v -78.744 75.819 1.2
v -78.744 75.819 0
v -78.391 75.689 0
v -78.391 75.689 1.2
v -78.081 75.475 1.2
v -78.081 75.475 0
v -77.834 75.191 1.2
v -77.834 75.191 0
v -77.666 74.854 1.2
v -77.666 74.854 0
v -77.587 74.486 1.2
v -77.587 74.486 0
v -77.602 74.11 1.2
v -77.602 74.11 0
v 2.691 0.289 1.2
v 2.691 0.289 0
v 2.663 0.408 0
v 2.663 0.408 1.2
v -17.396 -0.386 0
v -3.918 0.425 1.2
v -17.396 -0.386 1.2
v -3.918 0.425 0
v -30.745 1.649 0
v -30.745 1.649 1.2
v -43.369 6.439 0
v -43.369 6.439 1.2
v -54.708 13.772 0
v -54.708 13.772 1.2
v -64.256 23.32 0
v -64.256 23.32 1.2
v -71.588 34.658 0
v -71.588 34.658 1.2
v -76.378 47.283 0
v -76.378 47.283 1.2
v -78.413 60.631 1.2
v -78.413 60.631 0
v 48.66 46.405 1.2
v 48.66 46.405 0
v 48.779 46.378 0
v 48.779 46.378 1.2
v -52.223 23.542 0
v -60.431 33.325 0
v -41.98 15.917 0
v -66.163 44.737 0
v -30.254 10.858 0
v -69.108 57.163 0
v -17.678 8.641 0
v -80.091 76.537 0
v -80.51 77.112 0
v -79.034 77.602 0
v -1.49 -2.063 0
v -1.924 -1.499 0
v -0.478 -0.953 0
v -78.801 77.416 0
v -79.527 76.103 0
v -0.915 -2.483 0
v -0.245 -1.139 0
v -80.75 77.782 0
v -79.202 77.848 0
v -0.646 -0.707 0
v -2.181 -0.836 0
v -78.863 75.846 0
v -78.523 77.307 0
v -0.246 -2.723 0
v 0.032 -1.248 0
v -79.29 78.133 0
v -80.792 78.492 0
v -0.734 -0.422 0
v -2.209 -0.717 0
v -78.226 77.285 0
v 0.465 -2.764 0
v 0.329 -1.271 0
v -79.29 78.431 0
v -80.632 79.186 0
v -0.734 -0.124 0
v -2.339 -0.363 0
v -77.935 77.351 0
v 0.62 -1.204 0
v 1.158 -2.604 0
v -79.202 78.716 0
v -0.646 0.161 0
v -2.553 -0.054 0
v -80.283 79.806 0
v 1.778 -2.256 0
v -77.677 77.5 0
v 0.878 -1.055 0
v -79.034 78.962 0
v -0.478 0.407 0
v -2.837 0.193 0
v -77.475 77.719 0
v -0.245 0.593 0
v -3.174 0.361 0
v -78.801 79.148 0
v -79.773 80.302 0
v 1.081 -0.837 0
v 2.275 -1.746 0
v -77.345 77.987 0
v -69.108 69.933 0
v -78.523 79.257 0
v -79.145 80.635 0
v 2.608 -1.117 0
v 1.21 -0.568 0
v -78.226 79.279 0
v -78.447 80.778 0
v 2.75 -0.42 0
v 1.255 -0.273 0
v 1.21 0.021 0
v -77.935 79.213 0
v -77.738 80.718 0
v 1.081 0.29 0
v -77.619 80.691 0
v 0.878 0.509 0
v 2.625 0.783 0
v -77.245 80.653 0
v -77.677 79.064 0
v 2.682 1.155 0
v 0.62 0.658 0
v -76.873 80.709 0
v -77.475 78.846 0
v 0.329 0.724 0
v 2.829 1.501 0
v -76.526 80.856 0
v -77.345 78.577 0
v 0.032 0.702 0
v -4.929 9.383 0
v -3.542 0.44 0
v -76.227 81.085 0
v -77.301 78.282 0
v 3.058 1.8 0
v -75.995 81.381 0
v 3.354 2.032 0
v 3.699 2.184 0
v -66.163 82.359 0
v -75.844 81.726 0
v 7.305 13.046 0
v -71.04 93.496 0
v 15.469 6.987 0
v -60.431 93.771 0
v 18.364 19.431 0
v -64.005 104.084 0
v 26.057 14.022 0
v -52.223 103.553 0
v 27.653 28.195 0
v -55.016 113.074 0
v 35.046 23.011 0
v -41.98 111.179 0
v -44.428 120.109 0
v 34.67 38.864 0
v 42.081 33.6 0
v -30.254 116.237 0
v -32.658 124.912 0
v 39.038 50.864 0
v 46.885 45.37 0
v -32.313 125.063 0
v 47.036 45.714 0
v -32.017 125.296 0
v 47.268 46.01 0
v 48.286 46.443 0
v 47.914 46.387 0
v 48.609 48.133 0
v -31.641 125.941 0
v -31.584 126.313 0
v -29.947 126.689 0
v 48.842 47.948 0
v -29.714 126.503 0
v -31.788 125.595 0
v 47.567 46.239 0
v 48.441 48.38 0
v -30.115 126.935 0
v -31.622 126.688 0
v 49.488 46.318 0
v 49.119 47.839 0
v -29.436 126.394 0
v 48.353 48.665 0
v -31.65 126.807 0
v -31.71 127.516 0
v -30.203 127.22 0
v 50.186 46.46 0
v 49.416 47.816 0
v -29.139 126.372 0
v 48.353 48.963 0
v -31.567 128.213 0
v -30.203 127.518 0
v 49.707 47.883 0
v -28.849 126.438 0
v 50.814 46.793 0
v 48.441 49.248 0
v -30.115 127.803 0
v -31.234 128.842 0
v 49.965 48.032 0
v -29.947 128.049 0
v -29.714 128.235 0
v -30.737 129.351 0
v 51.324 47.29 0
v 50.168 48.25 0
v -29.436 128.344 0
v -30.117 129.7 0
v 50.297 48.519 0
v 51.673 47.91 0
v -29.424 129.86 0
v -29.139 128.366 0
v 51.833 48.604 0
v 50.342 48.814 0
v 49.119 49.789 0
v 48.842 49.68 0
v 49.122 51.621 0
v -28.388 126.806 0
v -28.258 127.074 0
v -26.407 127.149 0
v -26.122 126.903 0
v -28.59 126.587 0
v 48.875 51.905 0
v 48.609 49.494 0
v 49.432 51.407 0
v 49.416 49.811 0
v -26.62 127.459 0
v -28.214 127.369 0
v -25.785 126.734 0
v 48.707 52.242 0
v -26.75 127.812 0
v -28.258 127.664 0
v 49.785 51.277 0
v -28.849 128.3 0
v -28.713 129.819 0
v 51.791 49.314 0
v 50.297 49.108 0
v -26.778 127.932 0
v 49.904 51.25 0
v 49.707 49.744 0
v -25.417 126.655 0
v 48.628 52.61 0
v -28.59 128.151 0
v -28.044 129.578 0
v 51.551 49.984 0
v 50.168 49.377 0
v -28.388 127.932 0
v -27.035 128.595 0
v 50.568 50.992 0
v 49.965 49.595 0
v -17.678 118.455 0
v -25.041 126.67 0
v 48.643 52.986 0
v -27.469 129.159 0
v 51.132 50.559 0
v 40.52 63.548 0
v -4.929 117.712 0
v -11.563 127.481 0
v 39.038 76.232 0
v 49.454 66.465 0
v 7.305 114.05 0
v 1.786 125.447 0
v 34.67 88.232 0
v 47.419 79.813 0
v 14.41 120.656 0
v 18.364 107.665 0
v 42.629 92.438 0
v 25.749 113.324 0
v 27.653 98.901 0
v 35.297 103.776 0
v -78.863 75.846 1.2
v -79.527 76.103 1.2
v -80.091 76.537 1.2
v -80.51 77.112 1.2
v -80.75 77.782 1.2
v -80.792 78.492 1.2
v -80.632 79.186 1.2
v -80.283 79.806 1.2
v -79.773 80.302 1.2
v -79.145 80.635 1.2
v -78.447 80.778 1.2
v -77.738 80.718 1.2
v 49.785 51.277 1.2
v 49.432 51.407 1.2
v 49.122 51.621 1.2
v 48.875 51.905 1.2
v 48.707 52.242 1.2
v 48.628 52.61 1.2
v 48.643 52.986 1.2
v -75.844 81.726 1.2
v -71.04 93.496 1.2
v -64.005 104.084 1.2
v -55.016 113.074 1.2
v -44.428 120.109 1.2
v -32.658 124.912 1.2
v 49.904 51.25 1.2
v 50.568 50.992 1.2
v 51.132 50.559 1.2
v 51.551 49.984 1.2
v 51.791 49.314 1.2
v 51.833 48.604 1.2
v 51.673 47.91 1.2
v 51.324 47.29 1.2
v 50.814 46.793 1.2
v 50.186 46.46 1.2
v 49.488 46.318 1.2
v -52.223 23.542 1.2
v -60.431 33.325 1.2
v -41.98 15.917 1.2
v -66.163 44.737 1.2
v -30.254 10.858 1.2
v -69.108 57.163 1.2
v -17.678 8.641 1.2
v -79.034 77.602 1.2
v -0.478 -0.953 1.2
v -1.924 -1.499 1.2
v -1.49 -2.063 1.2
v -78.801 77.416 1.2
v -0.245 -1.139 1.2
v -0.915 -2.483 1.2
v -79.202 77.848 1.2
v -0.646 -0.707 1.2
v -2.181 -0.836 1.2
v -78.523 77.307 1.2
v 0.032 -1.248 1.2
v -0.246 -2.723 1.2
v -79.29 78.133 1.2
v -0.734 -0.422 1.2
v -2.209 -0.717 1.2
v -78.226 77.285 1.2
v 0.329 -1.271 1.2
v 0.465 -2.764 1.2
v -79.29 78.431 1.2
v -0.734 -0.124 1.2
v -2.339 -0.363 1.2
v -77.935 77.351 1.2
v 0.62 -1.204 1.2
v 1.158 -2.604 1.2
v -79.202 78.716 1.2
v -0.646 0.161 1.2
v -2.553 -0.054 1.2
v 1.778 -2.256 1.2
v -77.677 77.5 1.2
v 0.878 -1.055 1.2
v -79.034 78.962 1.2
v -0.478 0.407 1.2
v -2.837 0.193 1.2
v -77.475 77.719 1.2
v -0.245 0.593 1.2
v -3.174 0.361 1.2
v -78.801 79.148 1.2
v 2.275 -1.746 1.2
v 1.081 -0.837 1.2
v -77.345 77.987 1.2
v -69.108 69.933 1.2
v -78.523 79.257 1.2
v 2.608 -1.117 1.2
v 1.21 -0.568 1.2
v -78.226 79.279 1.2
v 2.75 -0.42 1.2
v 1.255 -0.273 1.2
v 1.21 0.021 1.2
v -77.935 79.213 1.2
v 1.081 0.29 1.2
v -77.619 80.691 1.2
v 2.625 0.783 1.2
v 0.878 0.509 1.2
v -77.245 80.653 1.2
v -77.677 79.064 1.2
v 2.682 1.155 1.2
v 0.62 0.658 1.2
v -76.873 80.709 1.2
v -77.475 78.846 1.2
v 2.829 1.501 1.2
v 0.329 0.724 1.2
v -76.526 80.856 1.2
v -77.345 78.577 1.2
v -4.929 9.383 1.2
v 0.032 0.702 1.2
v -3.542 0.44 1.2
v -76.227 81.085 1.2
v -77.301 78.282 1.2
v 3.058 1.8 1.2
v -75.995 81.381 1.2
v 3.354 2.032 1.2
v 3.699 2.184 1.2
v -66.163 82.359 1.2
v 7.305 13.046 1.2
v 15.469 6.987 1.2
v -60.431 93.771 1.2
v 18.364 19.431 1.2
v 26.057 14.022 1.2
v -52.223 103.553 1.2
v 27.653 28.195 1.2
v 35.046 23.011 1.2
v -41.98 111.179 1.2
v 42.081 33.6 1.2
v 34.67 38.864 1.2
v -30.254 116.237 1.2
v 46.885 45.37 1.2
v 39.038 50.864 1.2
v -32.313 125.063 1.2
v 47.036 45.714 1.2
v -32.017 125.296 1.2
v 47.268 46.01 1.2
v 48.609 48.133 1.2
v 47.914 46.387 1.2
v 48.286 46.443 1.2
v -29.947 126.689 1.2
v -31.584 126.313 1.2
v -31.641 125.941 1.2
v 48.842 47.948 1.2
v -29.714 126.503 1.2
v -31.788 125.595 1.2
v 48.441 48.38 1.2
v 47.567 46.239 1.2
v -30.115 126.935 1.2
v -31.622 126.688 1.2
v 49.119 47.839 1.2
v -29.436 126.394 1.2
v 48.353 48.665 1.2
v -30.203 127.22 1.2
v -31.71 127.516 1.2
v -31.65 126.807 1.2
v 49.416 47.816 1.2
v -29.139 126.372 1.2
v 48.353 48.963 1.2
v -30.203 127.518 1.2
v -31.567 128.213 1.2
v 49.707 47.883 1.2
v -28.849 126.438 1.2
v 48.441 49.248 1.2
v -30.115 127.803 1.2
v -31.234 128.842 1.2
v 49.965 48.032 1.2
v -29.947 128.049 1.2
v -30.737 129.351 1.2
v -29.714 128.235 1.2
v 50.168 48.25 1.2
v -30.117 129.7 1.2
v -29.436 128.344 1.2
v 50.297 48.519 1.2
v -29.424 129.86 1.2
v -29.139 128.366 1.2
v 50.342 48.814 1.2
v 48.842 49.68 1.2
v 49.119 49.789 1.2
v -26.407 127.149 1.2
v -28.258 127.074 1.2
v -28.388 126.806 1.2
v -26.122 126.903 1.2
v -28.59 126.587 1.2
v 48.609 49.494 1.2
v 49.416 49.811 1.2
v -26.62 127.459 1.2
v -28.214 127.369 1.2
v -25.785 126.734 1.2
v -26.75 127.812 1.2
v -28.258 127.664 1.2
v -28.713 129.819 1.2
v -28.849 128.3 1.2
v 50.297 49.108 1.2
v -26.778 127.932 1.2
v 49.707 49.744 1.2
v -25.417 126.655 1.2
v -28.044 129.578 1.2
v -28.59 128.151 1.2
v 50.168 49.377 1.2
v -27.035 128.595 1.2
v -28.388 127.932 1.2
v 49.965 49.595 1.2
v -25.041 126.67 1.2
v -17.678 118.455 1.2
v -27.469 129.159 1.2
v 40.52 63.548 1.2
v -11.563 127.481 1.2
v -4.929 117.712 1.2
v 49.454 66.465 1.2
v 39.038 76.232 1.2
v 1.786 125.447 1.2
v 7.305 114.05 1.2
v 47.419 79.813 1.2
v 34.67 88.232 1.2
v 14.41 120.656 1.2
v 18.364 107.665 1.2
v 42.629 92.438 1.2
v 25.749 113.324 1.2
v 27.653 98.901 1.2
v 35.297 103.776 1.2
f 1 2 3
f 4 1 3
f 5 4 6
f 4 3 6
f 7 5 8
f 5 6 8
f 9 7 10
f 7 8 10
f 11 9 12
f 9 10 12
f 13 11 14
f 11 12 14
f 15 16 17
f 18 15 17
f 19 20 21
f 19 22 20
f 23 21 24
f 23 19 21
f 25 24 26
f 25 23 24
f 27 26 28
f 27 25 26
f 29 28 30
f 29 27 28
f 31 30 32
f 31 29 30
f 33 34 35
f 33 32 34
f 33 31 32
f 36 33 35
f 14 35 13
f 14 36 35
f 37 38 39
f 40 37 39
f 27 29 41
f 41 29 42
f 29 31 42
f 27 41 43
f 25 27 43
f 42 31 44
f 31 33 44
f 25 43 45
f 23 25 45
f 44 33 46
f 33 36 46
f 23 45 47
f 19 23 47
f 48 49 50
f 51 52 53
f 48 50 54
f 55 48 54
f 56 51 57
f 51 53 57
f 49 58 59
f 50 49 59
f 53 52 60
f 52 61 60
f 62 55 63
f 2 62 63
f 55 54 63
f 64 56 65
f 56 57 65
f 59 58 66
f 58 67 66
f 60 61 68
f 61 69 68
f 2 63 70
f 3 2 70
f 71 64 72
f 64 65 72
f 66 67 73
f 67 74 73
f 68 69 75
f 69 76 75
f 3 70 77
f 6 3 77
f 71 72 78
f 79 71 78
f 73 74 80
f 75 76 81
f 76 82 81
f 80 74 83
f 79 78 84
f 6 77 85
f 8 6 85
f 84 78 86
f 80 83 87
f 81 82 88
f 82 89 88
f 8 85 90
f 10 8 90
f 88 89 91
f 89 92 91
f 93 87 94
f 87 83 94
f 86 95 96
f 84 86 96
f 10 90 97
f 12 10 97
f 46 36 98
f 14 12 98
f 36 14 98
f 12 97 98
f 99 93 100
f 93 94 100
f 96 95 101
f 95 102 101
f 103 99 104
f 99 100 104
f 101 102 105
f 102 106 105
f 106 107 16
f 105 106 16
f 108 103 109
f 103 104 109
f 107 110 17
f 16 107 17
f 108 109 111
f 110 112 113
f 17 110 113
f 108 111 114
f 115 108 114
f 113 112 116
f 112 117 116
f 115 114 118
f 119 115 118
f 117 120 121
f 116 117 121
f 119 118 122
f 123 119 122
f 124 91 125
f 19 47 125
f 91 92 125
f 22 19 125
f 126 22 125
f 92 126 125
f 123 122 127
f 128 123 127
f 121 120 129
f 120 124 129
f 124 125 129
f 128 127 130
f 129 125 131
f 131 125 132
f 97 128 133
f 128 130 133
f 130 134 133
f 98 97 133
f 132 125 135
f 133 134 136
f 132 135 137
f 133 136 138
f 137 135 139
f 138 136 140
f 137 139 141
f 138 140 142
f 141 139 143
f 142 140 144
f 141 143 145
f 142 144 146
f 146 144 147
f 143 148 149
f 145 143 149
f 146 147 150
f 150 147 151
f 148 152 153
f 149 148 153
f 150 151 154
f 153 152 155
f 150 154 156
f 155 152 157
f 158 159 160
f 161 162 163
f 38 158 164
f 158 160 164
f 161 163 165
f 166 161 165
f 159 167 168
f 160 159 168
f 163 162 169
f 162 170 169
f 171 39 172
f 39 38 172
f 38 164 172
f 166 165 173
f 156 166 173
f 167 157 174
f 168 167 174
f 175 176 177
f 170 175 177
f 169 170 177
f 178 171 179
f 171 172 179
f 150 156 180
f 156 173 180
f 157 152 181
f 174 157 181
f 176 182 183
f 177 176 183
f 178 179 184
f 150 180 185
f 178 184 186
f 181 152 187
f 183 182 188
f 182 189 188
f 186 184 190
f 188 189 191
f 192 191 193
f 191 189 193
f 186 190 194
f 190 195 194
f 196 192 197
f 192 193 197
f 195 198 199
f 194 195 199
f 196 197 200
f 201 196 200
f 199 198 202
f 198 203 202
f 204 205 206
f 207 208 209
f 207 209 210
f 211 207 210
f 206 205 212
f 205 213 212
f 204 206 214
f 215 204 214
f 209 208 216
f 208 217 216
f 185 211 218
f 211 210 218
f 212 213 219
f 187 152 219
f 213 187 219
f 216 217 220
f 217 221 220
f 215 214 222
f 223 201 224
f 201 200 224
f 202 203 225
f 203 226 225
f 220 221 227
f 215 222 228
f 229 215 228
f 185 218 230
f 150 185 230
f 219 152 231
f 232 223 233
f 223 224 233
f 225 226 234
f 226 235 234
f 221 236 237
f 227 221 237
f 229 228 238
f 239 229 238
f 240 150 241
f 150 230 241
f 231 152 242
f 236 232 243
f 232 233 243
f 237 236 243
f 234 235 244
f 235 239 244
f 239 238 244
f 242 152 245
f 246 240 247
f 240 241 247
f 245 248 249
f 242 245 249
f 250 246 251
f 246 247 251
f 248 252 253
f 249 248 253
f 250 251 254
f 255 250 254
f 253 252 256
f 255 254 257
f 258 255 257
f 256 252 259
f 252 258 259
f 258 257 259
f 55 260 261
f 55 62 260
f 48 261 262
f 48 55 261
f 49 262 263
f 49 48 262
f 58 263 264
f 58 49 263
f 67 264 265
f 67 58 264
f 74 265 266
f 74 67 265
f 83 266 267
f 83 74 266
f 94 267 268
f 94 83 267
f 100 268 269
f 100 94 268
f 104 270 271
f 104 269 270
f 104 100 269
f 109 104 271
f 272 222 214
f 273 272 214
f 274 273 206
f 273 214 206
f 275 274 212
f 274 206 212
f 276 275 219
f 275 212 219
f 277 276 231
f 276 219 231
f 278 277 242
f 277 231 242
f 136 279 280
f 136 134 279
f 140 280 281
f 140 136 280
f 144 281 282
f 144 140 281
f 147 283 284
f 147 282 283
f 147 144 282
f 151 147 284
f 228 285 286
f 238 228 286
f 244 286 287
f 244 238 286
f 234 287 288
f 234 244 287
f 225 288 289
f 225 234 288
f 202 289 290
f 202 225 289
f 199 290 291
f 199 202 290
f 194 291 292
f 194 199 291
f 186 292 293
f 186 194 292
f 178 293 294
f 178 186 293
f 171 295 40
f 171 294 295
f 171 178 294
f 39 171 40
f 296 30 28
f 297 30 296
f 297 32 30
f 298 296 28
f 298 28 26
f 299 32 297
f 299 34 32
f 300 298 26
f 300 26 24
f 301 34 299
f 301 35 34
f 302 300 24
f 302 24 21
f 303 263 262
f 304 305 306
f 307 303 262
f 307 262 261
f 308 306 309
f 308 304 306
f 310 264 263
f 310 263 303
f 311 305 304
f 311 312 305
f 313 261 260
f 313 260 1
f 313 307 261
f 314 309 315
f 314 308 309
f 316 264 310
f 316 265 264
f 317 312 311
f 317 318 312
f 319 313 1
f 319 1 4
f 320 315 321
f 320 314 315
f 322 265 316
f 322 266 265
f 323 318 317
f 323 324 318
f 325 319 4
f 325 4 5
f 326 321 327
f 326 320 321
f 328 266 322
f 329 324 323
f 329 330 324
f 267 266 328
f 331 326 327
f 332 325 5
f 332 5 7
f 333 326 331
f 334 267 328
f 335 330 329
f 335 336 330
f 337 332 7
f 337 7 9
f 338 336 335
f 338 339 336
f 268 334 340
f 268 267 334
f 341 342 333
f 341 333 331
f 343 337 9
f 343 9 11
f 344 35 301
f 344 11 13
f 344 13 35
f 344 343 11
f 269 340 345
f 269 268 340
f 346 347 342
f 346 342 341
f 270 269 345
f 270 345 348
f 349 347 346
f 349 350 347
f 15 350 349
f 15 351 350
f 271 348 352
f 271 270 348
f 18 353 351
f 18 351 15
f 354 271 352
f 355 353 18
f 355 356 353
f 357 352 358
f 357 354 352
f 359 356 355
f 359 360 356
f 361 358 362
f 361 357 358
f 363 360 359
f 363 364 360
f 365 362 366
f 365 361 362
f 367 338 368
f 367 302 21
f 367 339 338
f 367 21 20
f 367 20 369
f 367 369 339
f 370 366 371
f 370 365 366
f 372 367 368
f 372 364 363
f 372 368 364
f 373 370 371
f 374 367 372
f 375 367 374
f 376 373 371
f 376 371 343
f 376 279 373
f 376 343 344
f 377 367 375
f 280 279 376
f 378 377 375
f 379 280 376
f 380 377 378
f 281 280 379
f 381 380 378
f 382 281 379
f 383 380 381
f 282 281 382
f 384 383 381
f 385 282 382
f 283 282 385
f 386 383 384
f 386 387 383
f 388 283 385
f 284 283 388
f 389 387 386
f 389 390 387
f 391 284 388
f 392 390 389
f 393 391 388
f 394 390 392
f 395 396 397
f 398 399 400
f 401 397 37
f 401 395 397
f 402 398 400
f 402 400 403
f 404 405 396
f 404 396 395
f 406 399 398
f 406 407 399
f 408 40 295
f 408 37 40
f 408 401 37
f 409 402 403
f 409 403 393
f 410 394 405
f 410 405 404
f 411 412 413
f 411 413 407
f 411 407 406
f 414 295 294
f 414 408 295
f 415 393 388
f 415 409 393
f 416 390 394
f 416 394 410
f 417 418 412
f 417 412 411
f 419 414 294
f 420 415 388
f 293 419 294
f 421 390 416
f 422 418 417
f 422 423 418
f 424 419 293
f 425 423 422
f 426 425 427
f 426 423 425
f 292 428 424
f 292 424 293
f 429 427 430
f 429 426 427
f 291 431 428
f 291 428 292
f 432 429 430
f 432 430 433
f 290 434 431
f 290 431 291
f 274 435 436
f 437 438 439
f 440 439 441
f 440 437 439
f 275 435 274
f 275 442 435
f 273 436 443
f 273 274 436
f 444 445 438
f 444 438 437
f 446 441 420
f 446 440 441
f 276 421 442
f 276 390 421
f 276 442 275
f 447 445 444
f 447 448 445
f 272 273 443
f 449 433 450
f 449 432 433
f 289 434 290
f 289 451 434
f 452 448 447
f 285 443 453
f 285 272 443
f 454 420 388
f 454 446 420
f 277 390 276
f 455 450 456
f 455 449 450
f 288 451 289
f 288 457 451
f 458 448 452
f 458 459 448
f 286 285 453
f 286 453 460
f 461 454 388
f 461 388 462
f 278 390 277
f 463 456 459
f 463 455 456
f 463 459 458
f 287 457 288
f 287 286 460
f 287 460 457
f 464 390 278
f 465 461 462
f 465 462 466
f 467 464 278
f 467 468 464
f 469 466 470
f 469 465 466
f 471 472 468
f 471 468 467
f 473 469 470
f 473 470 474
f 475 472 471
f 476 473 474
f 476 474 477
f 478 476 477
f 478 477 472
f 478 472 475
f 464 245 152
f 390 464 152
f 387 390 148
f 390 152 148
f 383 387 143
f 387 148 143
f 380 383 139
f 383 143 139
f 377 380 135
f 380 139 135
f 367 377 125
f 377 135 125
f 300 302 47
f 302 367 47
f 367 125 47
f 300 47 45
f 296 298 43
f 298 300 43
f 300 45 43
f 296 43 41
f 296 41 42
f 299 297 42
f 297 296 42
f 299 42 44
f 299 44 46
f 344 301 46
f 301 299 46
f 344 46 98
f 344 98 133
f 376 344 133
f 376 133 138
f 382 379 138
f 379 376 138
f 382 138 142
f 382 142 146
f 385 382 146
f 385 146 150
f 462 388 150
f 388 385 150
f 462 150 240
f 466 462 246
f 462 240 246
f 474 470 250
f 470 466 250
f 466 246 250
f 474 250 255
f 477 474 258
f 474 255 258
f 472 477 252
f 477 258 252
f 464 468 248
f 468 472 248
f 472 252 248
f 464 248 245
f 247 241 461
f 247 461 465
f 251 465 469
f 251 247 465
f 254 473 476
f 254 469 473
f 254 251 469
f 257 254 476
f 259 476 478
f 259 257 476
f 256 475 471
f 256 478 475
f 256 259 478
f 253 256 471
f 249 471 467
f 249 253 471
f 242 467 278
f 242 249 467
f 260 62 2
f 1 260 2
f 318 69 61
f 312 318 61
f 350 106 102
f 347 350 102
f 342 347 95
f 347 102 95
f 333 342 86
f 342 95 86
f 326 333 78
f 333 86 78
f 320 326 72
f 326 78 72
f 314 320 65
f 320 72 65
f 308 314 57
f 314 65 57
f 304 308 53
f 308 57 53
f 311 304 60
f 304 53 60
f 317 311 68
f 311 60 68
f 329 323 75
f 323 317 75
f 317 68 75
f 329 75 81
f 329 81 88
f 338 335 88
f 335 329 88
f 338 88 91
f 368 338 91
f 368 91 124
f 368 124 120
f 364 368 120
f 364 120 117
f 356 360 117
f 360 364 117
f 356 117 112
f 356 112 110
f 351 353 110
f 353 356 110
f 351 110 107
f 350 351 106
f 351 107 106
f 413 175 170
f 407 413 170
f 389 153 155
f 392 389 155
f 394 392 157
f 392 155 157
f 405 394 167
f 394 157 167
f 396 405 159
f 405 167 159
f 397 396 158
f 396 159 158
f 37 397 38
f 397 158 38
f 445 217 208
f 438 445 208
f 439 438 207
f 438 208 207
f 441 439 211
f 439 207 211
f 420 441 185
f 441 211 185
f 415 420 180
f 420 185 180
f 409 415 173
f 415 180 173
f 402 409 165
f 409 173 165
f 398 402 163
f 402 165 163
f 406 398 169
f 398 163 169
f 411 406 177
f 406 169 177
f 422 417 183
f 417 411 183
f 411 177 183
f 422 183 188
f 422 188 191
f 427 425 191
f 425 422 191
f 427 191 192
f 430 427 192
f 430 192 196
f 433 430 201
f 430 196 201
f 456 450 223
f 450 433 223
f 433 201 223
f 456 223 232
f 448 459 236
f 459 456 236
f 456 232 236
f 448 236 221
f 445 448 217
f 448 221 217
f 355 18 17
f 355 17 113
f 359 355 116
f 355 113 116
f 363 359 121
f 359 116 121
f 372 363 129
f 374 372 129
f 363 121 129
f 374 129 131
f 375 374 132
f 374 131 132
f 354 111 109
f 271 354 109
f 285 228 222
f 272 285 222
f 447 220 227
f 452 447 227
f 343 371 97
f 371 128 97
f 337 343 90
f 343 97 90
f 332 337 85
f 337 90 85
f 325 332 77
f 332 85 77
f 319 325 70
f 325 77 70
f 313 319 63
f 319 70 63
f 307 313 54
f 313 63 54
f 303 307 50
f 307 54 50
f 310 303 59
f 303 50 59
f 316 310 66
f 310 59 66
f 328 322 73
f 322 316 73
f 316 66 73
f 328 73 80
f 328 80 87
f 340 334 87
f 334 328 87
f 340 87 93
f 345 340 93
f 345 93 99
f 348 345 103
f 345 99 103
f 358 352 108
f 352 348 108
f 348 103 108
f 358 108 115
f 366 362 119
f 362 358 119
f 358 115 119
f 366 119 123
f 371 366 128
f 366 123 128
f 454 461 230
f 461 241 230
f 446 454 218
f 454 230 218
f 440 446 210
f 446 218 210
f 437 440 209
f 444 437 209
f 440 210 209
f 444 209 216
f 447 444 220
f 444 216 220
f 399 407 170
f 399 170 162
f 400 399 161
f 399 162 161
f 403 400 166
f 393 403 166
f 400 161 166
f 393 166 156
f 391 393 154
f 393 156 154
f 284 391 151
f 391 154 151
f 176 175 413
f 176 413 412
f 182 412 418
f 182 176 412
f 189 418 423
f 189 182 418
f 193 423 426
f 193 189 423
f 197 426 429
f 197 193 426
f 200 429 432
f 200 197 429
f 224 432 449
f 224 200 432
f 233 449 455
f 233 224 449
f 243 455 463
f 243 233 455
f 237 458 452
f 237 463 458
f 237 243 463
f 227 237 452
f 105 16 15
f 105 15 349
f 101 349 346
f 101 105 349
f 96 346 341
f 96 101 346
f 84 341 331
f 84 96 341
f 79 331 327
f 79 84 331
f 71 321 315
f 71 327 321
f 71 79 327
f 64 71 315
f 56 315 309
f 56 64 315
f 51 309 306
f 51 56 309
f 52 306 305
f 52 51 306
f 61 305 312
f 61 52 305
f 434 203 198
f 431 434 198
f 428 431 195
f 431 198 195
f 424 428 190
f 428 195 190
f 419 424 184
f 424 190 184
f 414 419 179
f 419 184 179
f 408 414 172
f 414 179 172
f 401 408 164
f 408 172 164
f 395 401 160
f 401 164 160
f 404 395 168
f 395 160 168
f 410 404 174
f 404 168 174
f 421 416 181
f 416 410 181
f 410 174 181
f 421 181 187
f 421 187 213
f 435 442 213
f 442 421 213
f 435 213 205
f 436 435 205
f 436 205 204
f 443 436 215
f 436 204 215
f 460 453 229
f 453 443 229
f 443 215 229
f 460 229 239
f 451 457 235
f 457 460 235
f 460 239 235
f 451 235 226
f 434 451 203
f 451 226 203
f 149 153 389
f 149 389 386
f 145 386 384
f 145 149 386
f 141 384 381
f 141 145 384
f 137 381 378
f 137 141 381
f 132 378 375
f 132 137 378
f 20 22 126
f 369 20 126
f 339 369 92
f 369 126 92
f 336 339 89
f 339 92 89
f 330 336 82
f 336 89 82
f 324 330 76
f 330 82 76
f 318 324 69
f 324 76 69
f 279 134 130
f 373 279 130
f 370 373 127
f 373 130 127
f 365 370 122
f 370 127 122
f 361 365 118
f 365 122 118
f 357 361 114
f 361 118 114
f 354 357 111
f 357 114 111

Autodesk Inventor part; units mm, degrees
ref_plane "YZ Plane" through (0, 0, 0) normal (1, 0, 0) x (0, 1, 0)
ref_plane "XZ Plane" through (0, 0, 0) normal (0, 1, 0) x (-1, 0, 0)
ref_plane "作業平面1" through (0, 0, 0) normal (0, 0, 1) x (1, 0, 0)
sketch "スケッチ1" plane through (0, 0, 0) normal (0, 0, 1) x (1, 0, 0)
  circle A0 centre (-14.624772, 63.539385) radius 64
  arc A1 (-81.893775, 52.547912) -> (-80.479561, 53.962126) centre (-81.186668, 53.255019) ccw
  line L0 (-81.893775, 52.547912) -> (-83.065348, 52.547912)
  arc A2 (-84.479561, 53.962126) -> (-83.065348, 52.547912) centre (-83.772455, 53.255019) ccw
  line L1 (-84.479561, 53.962126) -> (-84.479561, 73.133699)
  arc A3 (-83.065348, 74.547912) -> (-84.479561, 73.133699) centre (-83.772455, 73.840806) ccw
  line L2 (-83.065348, 74.547912) -> (-81.893775, 74.547912)
  arc A4 (-80.479561, 73.133699) -> (-81.893775, 74.547912) centre (-81.186668, 73.840806) ccw
  line L3 (-80.479561, 73.133699) -> (-80.479561, 53.962126)
  arc A5 (-3.479561, 132.133699) -> (-4.893775, 133.547912) centre (-4.186668, 132.840806) ccw
  line L4 (-3.479561, 132.133699) -> (-3.479561, 130.962126)
  arc A6 (-4.893775, 129.547912) -> (-3.479561, 130.962126) centre (-4.186668, 130.255019) ccw
  line L5 (-4.893775, 129.547912) -> (-24.065348, 129.547912)
  arc A7 (-25.479561, 130.962126) -> (-24.065348, 129.547912) centre (-24.772455, 130.255019) ccw
  line L6 (-25.479561, 130.962126) -> (-25.479561, 132.133699)
  arc A8 (-24.065348, 133.547912) -> (-25.479561, 132.133699) centre (-24.772455, 132.840806) ccw
  line L7 (-24.065348, 133.547912) -> (-4.893775, 133.547912)
  arc A9 (54.106225, 52.547912) -> (55.520439, 53.962126) centre (54.813332, 53.255019) ccw
  line L8 (54.106225, 52.547912) -> (52.934652, 52.547912)
  arc A10 (51.520439, 53.962126) -> (52.934652, 52.547912) centre (52.227545, 53.255019) ccw
  line L9 (51.520439, 53.962126) -> (51.520439, 73.133699)
  arc A11 (52.934652, 74.547912) -> (51.520439, 73.133699) centre (52.227545, 73.840806) ccw
  line L10 (52.934652, 74.547912) -> (54.106225, 74.547912)
  arc A12 (55.520439, 73.133699) -> (54.106225, 74.547912) centre (54.813332, 73.840806) ccw
  line L11 (55.520439, 73.133699) -> (55.520439, 53.962126)
  arc A13 (-25.479561, -5.037874) -> (-24.065348, -6.452088) centre (-24.772455, -5.744981) ccw
  line L12 (-25.479561, -5.037874) -> (-25.479561, -3.866301)
  arc A14 (-24.065348, -2.452088) -> (-25.479561, -3.866301) centre (-24.772455, -3.159194) ccw
  line L13 (-24.065348, -2.452088) -> (-4.893775, -2.452088)
  arc A15 (-3.479561, -3.866301) -> (-4.893775, -2.452088) centre (-4.186668, -3.159194) ccw
  line L14 (-3.479561, -3.866301) -> (-3.479561, -5.037874)
  arc A16 (-4.893775, -6.452088) -> (-3.479561, -5.037874) centre (-4.186668, -5.744981) ccw
  line L15 (-4.893775, -6.452088) -> (-24.065348, -6.452088)
  arc A17 (-90.380937, 104.093949) -> (-92.776199, 103.718007) centre (-91.441598, 103.033289) ccw
  arc A18 (-92.776199, 103.718007) -> (-98.248191, 90.50745) centre (-14.479561, 63.547912) ccw
  arc A19 (-98.248191, 90.50745) -> (-96.820317, 88.547912) centre (-96.820317, 90.047912) ccw
  line L16 (-96.820317, 88.547912) -> (-88.479561, 88.547912)
  arc A20 (-86.479561, 86.547912) -> (-88.479561, 88.547912) centre (-88.479561, 86.547912) ccw
  line L17 (-86.479561, 86.547912) -> (-86.479561, 40.547912)
  arc A21 (-88.479561, 38.547912) -> (-86.479561, 40.547912) centre (-88.479561, 40.547912) ccw
  line L18 (-88.479561, 38.547912) -> (-96.820317, 38.547912)
  arc A22 (-96.820317, 38.547912) -> (-98.248191, 36.588375) centre (-96.820317, 37.047912) ccw
  arc A23 (-98.248191, 36.588375) -> (-41.439099, -20.220717) centre (-14.479561, 63.547912) ccw
  arc A24 (-41.439099, -20.220717) -> (-39.479561, -18.792843) centre (-40.979561, -18.792843) ccw
  line L19 (-39.479561, -18.792843) -> (-39.479561, -10.452088)
  arc A25 (-37.479561, -8.452088) -> (-39.479561, -10.452088) centre (-37.479561, -10.452088) ccw
  line L20 (-37.479561, -8.452088) -> (8.520439, -8.452088)
  arc A26 (10.520439, -10.452088) -> (8.520439, -8.452088) centre (8.520439, -10.452088) ccw
  line L21 (10.520439, -10.452088) -> (10.520439, -18.792843)
  arc A27 (10.520439, -18.792843) -> (12.479976, -20.220717) centre (12.020439, -18.792843) ccw
  arc A28 (12.479976, -20.220717) -> (25.690533, -14.748726) centre (-14.479561, 63.547912) ccw
  arc A29 (25.690533, -14.748726) -> (26.066476, -12.353464) centre (25.005815, -13.414124) ccw
  line L22 (26.066476, -12.353464) -> (20.079693, -6.366681)
  arc A30 (20.079693, -2.124041) -> (20.079693, -6.366681) centre (22.201014, -4.245361) ccw
  line L23 (20.079693, -2.124041) -> (22.554567, 0.350833)
  arc A31 (55.435032, 28.988658) -> (51.192392, 28.988658) centre (53.313712, 26.867337) ccw
  line L24 (55.435032, 28.988658) -> (61.421815, 23.001875)
  arc A32 (61.421815, 23.001875) -> (63.817077, 23.377818) centre (62.482475, 24.062536) ccw
  arc A33 (63.817077, 23.377818) -> (69.289068, 36.588375) centre (-14.479561, 63.547912) ccw
  arc A34 (69.289068, 36.588375) -> (67.861194, 38.547912) centre (67.861194, 37.047912) ccw
  line L25 (67.861194, 38.547912) -> (59.520439, 38.547912)
  arc A35 (57.520439, 40.547912) -> (59.520439, 38.547912) centre (59.520439, 40.547912) ccw
  line L26 (57.520439, 40.547912) -> (57.520439, 86.547912)
  arc A36 (59.520439, 88.547912) -> (57.520439, 86.547912) centre (59.520439, 86.547912) ccw
  line L27 (59.520439, 88.547912) -> (67.861194, 88.547912)
  arc A37 (67.861194, 88.547912) -> (69.289068, 90.50745) centre (67.861194, 90.047912) ccw
  arc A38 (69.289068, 90.50745) -> (12.479976, 147.316542) centre (-14.479561, 63.547912) ccw
  arc A39 (12.479976, 147.316542) -> (10.520439, 145.888668) centre (12.020439, 145.888668) ccw
  line L28 (10.520439, 145.888668) -> (10.520439, 137.547912)
  arc A40 (8.520439, 135.547912) -> (10.520439, 137.547912) centre (8.520439, 137.547912) ccw
  line L29 (8.520439, 135.547912) -> (-37.479561, 135.547912)
  arc A41 (-39.479561, 137.547912) -> (-37.479561, 135.547912) centre (-37.479561, 137.547912) ccw
  line L30 (-39.479561, 137.547912) -> (-39.479561, 145.888668)
  arc A42 (-39.479561, 145.888668) -> (-41.439099, 147.316542) centre (-40.979561, 145.888668) ccw
  arc A43 (-41.439099, 147.316542) -> (-54.649656, 141.84455) centre (-14.479561, 63.547912) ccw
  arc A44 (-54.649656, 141.84455) -> (-55.025598, 139.449288) centre (-53.964938, 140.509949) ccw
  line L31 (-55.025598, 139.449288) -> (-49.038816, 133.462506)
  arc A45 (-49.038816, 129.219865) -> (-49.038816, 133.462506) centre (-51.160136, 131.341186) ccw
  line L32 (-54.342117, 123.916565) -> (-74.848214, 103.410468)
  arc A46 (-84.394155, 98.107167) -> (-80.151514, 98.107167) centre (-82.272835, 100.228487) ccw
  line L33 (-84.394155, 98.107167) -> (-90.380937, 104.093949)
  arc A47 (-32.657783, 124.912008) -> (-31.62228, 126.687656) centre (-33.083835, 126.350229) ccw
  line L34 (-31.62228, 126.687656) -> (-31.649781, 126.806774)
  arc A48 (-26.77793, 127.931529) -> (-31.649781, 126.806774) centre (-29.213855, 127.369152) ccw
  line L35 (-26.77793, 127.931529) -> (-26.75043, 127.812411)
  arc A49 (-26.75043, 127.812411) -> (-25.041333, 126.670404) centre (-25.288875, 128.149838) ccw
  arc A50 (48.642931, 52.986141) -> (-25.041333, 126.670404) centre (-14.479561, 63.547912) ccw
  arc A51 (48.642931, 52.986141) -> (49.784937, 51.277044) centre (50.122364, 52.738599) ccw
  line L36 (49.784937, 51.277044) -> (49.904056, 51.249544)
  arc A52 (48.7793, 46.377693) -> (49.904056, 51.249544) centre (49.341678, 48.813618) ccw
  line L37 (48.7793, 46.377693) -> (48.660182, 46.405194)
  arc A53 (48.660182, 46.405194) -> (46.884535, 45.369691) centre (48.322756, 44.943639) ccw
  arc A54 (3.69866, 2.183817) -> (46.884535, 45.369691) centre (-14.479561, 63.547912) ccw
  arc A55 (3.69866, 2.183817) -> (2.663157, 0.408169) centre (4.124712, 0.745596) ccw
  line L38 (2.663157, 0.408169) -> (2.690658, 0.289051)
  arc A56 (-2.181192, -0.835704) -> (2.690658, 0.289051) centre (0.254733, -0.273327) ccw
  line L39 (-2.181192, -0.835704) -> (-2.208693, -0.716586)
  arc A57 (-2.208693, -0.716586) -> (-3.91779, 0.425421) centre (-3.670248, -1.054013) ccw
  arc A58 (-77.602053, 74.109684) -> (-3.91779, 0.425421) centre (-14.479561, 63.547912) ccw
  arc A59 (-77.602053, 74.109684) -> (-78.74406, 75.818781) centre (-79.081487, 74.357226) ccw
  line L40 (-78.74406, 75.818781) -> (-78.863178, 75.846281)
  arc A60 (-77.738423, 80.718132) -> (-78.863178, 75.846281) centre (-78.300801, 78.282206) ccw
  line L41 (-77.738423, 80.718132) -> (-77.619305, 80.690631)
  arc A61 (-77.619305, 80.690631) -> (-75.843657, 81.726134) centre (-77.281878, 82.152186) ccw
  arc A62 (-32.657783, 124.912008) -> (-75.843657, 81.726134) centre (-14.479561, 63.547912) ccw
  circle A63 centre (65.069166, 92.047912) radius 2.5
  circle A64 centre (-42.979561, -16.000815) radius 2.5
  circle A65 centre (14.020439, 143.09664) radius 2.5
  circle A66 centre (-94.028289, 35.047912) radius 2.5
  circle A67 centre (49.341678, 48.813618) radius 1
  circle A68 centre (0.254733, -0.273327) radius 1
  circle A69 centre (-78.300801, 78.282206) radius 1
  circle A70 centre (-29.213855, 127.369152) radius 1
  circle A71 centre (-14.479561, 63.547912) radius 55
  circle A72 centre (19.135053, 141.074087) radius 2
  circle A73 centre (63.046613, 97.162527) radius 2
  circle A74 centre (2.020439, 127.968406) radius 2
  circle A75 centre (49.940932, 80.047912) radius 2
  line L42 (-74.848214, 103.410468) -> (-72.019786, 100.582041)
  line L43 (-71.31268, 99.874934) -> (-74.141107, 97.046507)
  line L44 (-74.848214, 97.753614) -> (-77.676641, 100.582041)
  line L45 (-49.038816, 129.219865) -> (-51.51369, 126.744992)
  line L46 (-51.51369, 126.744992) -> (-48.685263, 123.916565)
  line L47 (-47.978156, 123.209458) -> (-50.806583, 120.381031)
  line L48 (-51.51369, 121.088137) -> (-54.342117, 123.916565)
  arc A76 (-47.978156, 123.209458) -> (-48.685263, 123.916565) centre (-48.331709, 123.563011) ccw
  arc A77 (-51.51369, 121.088137) -> (-50.806583, 120.381031) centre (-51.160136, 120.734584) ccw
  arc A78 (-71.31268, 99.874934) -> (-72.019786, 100.582041) centre (-71.666233, 100.228487) ccw
  arc A79 (-74.848214, 97.753614) -> (-74.141107, 97.046507) centre (-74.49466, 97.40006) ccw
  line L49 (-77.676641, 100.582041) -> (-80.151514, 98.107167)
  line L50 (22.554567, 0.350833) -> (19.72614, 3.17926)
  arc A80 (19.019033, 3.886367) -> (19.72614, 3.17926) centre (19.372587, 3.532814) ccw
  line L51 (19.019033, 3.886367) -> (21.84746, 6.714794)
  arc A81 (22.554567, 6.007687) -> (21.84746, 6.714794) centre (22.201014, 6.361241) ccw
  line L52 (22.554567, 6.007687) -> (25.382994, 3.17926)
  line L53 (25.382994, 3.17926) -> (45.889091, 23.685357)
  line L54 (45.889091, 23.685357) -> (43.060664, 26.513784)
  arc A82 (42.353557, 27.220891) -> (43.060664, 26.513784) centre (42.70711, 26.867337) ccw
  line L55 (42.353557, 27.220891) -> (45.181984, 30.049318)
  arc A83 (45.889091, 29.342211) -> (45.181984, 30.049318) centre (45.535537, 29.695765) ccw
  line L56 (45.889091, 29.342211) -> (48.717518, 26.513784)
  line L57 (48.717518, 26.513784) -> (51.192392, 28.988658)
  point P0 (0, 0)
  dimension "d0" = 2
  dimension "d3" = 110
sketch "スケッチ1 outline for 押し出し1" plane through (0, 0, 0) normal (0, 0, 1) x (1, 0, 0)
  line L0 (-78.863178, 75.846281) -> (-78.74406, 75.818781)
  arc A0 (-77.738423, 80.718132) -> (-78.863178, 75.846281) centre (-78.300801, 78.282206) ccw
  arc A1 (-78.74406, 75.818781) -> (-77.602053, 74.109684) centre (-79.081487, 74.357226) cw
  line L1 (-77.619305, 80.690631) -> (-77.738423, 80.718132)
  arc A2 (-77.602053, 74.109684) -> (-3.91779, 0.425421) centre (-14.479561, 63.547912) ccw
  arc A3 (-75.843657, 81.726134) -> (-77.619305, 80.690631) centre (-77.281878, 82.152186) cw
  arc A4 (-3.91779, 0.425421) -> (-2.208693, -0.716586) centre (-3.670248, -1.054013) cw
  arc A5 (-32.657783, 124.912008) -> (-75.843657, 81.726134) centre (-14.479561, 63.547912) ccw
  line L2 (-2.208693, -0.716586) -> (-2.181192, -0.835704)
  arc A6 (-31.62228, 126.687656) -> (-32.657783, 124.912008) centre (-33.083835, 126.350229) cw
  arc A7 (-2.181192, -0.835704) -> (2.690658, 0.289051) centre (0.254733, -0.273327) ccw
  line L3 (-31.649781, 126.806774) -> (-31.62228, 126.687656)
  line L4 (2.690658, 0.289051) -> (2.663157, 0.408169)
  arc A8 (-26.77793, 127.931529) -> (-31.649781, 126.806774) centre (-29.213855, 127.369152) ccw
  arc A9 (2.663157, 0.408169) -> (3.69866, 2.183817) centre (4.124712, 0.745596) cw
  line L5 (-26.75043, 127.812411) -> (-26.77793, 127.931529)
  arc A10 (3.69866, 2.183817) -> (46.884535, 45.369691) centre (-14.479561, 63.547912) ccw
  arc A11 (-25.041333, 126.670404) -> (-26.75043, 127.812411) centre (-25.288875, 128.149838) cw
  arc A12 (46.884535, 45.369691) -> (48.660182, 46.405194) centre (48.322756, 44.943639) cw
  arc A13 (48.642931, 52.986141) -> (-25.041333, 126.670404) centre (-14.479561, 63.547912) ccw
  line L6 (48.660182, 46.405194) -> (48.7793, 46.377693)
  arc A14 (49.784937, 51.277044) -> (48.642931, 52.986141) centre (50.122364, 52.738599) cw
  arc A15 (48.7793, 46.377693) -> (49.904056, 51.249544) centre (49.341678, 48.813618) ccw
  line L7 (49.904056, 51.249544) -> (49.784937, 51.277044)
  circle A16 centre (0.254733, -0.273327) radius 1
  circle A17 centre (-14.479561, 63.547912) radius 55
  circle A18 centre (49.341678, 48.813618) radius 1
  circle A19 centre (-78.300801, 78.282206) radius 1
  circle A20 centre (-29.213855, 127.369152) radius 1
extrude "押し出し1" add sketch "スケッチ1 outline for 押し出し1" along normal blind 1.2
properties part number "LineSensor"
